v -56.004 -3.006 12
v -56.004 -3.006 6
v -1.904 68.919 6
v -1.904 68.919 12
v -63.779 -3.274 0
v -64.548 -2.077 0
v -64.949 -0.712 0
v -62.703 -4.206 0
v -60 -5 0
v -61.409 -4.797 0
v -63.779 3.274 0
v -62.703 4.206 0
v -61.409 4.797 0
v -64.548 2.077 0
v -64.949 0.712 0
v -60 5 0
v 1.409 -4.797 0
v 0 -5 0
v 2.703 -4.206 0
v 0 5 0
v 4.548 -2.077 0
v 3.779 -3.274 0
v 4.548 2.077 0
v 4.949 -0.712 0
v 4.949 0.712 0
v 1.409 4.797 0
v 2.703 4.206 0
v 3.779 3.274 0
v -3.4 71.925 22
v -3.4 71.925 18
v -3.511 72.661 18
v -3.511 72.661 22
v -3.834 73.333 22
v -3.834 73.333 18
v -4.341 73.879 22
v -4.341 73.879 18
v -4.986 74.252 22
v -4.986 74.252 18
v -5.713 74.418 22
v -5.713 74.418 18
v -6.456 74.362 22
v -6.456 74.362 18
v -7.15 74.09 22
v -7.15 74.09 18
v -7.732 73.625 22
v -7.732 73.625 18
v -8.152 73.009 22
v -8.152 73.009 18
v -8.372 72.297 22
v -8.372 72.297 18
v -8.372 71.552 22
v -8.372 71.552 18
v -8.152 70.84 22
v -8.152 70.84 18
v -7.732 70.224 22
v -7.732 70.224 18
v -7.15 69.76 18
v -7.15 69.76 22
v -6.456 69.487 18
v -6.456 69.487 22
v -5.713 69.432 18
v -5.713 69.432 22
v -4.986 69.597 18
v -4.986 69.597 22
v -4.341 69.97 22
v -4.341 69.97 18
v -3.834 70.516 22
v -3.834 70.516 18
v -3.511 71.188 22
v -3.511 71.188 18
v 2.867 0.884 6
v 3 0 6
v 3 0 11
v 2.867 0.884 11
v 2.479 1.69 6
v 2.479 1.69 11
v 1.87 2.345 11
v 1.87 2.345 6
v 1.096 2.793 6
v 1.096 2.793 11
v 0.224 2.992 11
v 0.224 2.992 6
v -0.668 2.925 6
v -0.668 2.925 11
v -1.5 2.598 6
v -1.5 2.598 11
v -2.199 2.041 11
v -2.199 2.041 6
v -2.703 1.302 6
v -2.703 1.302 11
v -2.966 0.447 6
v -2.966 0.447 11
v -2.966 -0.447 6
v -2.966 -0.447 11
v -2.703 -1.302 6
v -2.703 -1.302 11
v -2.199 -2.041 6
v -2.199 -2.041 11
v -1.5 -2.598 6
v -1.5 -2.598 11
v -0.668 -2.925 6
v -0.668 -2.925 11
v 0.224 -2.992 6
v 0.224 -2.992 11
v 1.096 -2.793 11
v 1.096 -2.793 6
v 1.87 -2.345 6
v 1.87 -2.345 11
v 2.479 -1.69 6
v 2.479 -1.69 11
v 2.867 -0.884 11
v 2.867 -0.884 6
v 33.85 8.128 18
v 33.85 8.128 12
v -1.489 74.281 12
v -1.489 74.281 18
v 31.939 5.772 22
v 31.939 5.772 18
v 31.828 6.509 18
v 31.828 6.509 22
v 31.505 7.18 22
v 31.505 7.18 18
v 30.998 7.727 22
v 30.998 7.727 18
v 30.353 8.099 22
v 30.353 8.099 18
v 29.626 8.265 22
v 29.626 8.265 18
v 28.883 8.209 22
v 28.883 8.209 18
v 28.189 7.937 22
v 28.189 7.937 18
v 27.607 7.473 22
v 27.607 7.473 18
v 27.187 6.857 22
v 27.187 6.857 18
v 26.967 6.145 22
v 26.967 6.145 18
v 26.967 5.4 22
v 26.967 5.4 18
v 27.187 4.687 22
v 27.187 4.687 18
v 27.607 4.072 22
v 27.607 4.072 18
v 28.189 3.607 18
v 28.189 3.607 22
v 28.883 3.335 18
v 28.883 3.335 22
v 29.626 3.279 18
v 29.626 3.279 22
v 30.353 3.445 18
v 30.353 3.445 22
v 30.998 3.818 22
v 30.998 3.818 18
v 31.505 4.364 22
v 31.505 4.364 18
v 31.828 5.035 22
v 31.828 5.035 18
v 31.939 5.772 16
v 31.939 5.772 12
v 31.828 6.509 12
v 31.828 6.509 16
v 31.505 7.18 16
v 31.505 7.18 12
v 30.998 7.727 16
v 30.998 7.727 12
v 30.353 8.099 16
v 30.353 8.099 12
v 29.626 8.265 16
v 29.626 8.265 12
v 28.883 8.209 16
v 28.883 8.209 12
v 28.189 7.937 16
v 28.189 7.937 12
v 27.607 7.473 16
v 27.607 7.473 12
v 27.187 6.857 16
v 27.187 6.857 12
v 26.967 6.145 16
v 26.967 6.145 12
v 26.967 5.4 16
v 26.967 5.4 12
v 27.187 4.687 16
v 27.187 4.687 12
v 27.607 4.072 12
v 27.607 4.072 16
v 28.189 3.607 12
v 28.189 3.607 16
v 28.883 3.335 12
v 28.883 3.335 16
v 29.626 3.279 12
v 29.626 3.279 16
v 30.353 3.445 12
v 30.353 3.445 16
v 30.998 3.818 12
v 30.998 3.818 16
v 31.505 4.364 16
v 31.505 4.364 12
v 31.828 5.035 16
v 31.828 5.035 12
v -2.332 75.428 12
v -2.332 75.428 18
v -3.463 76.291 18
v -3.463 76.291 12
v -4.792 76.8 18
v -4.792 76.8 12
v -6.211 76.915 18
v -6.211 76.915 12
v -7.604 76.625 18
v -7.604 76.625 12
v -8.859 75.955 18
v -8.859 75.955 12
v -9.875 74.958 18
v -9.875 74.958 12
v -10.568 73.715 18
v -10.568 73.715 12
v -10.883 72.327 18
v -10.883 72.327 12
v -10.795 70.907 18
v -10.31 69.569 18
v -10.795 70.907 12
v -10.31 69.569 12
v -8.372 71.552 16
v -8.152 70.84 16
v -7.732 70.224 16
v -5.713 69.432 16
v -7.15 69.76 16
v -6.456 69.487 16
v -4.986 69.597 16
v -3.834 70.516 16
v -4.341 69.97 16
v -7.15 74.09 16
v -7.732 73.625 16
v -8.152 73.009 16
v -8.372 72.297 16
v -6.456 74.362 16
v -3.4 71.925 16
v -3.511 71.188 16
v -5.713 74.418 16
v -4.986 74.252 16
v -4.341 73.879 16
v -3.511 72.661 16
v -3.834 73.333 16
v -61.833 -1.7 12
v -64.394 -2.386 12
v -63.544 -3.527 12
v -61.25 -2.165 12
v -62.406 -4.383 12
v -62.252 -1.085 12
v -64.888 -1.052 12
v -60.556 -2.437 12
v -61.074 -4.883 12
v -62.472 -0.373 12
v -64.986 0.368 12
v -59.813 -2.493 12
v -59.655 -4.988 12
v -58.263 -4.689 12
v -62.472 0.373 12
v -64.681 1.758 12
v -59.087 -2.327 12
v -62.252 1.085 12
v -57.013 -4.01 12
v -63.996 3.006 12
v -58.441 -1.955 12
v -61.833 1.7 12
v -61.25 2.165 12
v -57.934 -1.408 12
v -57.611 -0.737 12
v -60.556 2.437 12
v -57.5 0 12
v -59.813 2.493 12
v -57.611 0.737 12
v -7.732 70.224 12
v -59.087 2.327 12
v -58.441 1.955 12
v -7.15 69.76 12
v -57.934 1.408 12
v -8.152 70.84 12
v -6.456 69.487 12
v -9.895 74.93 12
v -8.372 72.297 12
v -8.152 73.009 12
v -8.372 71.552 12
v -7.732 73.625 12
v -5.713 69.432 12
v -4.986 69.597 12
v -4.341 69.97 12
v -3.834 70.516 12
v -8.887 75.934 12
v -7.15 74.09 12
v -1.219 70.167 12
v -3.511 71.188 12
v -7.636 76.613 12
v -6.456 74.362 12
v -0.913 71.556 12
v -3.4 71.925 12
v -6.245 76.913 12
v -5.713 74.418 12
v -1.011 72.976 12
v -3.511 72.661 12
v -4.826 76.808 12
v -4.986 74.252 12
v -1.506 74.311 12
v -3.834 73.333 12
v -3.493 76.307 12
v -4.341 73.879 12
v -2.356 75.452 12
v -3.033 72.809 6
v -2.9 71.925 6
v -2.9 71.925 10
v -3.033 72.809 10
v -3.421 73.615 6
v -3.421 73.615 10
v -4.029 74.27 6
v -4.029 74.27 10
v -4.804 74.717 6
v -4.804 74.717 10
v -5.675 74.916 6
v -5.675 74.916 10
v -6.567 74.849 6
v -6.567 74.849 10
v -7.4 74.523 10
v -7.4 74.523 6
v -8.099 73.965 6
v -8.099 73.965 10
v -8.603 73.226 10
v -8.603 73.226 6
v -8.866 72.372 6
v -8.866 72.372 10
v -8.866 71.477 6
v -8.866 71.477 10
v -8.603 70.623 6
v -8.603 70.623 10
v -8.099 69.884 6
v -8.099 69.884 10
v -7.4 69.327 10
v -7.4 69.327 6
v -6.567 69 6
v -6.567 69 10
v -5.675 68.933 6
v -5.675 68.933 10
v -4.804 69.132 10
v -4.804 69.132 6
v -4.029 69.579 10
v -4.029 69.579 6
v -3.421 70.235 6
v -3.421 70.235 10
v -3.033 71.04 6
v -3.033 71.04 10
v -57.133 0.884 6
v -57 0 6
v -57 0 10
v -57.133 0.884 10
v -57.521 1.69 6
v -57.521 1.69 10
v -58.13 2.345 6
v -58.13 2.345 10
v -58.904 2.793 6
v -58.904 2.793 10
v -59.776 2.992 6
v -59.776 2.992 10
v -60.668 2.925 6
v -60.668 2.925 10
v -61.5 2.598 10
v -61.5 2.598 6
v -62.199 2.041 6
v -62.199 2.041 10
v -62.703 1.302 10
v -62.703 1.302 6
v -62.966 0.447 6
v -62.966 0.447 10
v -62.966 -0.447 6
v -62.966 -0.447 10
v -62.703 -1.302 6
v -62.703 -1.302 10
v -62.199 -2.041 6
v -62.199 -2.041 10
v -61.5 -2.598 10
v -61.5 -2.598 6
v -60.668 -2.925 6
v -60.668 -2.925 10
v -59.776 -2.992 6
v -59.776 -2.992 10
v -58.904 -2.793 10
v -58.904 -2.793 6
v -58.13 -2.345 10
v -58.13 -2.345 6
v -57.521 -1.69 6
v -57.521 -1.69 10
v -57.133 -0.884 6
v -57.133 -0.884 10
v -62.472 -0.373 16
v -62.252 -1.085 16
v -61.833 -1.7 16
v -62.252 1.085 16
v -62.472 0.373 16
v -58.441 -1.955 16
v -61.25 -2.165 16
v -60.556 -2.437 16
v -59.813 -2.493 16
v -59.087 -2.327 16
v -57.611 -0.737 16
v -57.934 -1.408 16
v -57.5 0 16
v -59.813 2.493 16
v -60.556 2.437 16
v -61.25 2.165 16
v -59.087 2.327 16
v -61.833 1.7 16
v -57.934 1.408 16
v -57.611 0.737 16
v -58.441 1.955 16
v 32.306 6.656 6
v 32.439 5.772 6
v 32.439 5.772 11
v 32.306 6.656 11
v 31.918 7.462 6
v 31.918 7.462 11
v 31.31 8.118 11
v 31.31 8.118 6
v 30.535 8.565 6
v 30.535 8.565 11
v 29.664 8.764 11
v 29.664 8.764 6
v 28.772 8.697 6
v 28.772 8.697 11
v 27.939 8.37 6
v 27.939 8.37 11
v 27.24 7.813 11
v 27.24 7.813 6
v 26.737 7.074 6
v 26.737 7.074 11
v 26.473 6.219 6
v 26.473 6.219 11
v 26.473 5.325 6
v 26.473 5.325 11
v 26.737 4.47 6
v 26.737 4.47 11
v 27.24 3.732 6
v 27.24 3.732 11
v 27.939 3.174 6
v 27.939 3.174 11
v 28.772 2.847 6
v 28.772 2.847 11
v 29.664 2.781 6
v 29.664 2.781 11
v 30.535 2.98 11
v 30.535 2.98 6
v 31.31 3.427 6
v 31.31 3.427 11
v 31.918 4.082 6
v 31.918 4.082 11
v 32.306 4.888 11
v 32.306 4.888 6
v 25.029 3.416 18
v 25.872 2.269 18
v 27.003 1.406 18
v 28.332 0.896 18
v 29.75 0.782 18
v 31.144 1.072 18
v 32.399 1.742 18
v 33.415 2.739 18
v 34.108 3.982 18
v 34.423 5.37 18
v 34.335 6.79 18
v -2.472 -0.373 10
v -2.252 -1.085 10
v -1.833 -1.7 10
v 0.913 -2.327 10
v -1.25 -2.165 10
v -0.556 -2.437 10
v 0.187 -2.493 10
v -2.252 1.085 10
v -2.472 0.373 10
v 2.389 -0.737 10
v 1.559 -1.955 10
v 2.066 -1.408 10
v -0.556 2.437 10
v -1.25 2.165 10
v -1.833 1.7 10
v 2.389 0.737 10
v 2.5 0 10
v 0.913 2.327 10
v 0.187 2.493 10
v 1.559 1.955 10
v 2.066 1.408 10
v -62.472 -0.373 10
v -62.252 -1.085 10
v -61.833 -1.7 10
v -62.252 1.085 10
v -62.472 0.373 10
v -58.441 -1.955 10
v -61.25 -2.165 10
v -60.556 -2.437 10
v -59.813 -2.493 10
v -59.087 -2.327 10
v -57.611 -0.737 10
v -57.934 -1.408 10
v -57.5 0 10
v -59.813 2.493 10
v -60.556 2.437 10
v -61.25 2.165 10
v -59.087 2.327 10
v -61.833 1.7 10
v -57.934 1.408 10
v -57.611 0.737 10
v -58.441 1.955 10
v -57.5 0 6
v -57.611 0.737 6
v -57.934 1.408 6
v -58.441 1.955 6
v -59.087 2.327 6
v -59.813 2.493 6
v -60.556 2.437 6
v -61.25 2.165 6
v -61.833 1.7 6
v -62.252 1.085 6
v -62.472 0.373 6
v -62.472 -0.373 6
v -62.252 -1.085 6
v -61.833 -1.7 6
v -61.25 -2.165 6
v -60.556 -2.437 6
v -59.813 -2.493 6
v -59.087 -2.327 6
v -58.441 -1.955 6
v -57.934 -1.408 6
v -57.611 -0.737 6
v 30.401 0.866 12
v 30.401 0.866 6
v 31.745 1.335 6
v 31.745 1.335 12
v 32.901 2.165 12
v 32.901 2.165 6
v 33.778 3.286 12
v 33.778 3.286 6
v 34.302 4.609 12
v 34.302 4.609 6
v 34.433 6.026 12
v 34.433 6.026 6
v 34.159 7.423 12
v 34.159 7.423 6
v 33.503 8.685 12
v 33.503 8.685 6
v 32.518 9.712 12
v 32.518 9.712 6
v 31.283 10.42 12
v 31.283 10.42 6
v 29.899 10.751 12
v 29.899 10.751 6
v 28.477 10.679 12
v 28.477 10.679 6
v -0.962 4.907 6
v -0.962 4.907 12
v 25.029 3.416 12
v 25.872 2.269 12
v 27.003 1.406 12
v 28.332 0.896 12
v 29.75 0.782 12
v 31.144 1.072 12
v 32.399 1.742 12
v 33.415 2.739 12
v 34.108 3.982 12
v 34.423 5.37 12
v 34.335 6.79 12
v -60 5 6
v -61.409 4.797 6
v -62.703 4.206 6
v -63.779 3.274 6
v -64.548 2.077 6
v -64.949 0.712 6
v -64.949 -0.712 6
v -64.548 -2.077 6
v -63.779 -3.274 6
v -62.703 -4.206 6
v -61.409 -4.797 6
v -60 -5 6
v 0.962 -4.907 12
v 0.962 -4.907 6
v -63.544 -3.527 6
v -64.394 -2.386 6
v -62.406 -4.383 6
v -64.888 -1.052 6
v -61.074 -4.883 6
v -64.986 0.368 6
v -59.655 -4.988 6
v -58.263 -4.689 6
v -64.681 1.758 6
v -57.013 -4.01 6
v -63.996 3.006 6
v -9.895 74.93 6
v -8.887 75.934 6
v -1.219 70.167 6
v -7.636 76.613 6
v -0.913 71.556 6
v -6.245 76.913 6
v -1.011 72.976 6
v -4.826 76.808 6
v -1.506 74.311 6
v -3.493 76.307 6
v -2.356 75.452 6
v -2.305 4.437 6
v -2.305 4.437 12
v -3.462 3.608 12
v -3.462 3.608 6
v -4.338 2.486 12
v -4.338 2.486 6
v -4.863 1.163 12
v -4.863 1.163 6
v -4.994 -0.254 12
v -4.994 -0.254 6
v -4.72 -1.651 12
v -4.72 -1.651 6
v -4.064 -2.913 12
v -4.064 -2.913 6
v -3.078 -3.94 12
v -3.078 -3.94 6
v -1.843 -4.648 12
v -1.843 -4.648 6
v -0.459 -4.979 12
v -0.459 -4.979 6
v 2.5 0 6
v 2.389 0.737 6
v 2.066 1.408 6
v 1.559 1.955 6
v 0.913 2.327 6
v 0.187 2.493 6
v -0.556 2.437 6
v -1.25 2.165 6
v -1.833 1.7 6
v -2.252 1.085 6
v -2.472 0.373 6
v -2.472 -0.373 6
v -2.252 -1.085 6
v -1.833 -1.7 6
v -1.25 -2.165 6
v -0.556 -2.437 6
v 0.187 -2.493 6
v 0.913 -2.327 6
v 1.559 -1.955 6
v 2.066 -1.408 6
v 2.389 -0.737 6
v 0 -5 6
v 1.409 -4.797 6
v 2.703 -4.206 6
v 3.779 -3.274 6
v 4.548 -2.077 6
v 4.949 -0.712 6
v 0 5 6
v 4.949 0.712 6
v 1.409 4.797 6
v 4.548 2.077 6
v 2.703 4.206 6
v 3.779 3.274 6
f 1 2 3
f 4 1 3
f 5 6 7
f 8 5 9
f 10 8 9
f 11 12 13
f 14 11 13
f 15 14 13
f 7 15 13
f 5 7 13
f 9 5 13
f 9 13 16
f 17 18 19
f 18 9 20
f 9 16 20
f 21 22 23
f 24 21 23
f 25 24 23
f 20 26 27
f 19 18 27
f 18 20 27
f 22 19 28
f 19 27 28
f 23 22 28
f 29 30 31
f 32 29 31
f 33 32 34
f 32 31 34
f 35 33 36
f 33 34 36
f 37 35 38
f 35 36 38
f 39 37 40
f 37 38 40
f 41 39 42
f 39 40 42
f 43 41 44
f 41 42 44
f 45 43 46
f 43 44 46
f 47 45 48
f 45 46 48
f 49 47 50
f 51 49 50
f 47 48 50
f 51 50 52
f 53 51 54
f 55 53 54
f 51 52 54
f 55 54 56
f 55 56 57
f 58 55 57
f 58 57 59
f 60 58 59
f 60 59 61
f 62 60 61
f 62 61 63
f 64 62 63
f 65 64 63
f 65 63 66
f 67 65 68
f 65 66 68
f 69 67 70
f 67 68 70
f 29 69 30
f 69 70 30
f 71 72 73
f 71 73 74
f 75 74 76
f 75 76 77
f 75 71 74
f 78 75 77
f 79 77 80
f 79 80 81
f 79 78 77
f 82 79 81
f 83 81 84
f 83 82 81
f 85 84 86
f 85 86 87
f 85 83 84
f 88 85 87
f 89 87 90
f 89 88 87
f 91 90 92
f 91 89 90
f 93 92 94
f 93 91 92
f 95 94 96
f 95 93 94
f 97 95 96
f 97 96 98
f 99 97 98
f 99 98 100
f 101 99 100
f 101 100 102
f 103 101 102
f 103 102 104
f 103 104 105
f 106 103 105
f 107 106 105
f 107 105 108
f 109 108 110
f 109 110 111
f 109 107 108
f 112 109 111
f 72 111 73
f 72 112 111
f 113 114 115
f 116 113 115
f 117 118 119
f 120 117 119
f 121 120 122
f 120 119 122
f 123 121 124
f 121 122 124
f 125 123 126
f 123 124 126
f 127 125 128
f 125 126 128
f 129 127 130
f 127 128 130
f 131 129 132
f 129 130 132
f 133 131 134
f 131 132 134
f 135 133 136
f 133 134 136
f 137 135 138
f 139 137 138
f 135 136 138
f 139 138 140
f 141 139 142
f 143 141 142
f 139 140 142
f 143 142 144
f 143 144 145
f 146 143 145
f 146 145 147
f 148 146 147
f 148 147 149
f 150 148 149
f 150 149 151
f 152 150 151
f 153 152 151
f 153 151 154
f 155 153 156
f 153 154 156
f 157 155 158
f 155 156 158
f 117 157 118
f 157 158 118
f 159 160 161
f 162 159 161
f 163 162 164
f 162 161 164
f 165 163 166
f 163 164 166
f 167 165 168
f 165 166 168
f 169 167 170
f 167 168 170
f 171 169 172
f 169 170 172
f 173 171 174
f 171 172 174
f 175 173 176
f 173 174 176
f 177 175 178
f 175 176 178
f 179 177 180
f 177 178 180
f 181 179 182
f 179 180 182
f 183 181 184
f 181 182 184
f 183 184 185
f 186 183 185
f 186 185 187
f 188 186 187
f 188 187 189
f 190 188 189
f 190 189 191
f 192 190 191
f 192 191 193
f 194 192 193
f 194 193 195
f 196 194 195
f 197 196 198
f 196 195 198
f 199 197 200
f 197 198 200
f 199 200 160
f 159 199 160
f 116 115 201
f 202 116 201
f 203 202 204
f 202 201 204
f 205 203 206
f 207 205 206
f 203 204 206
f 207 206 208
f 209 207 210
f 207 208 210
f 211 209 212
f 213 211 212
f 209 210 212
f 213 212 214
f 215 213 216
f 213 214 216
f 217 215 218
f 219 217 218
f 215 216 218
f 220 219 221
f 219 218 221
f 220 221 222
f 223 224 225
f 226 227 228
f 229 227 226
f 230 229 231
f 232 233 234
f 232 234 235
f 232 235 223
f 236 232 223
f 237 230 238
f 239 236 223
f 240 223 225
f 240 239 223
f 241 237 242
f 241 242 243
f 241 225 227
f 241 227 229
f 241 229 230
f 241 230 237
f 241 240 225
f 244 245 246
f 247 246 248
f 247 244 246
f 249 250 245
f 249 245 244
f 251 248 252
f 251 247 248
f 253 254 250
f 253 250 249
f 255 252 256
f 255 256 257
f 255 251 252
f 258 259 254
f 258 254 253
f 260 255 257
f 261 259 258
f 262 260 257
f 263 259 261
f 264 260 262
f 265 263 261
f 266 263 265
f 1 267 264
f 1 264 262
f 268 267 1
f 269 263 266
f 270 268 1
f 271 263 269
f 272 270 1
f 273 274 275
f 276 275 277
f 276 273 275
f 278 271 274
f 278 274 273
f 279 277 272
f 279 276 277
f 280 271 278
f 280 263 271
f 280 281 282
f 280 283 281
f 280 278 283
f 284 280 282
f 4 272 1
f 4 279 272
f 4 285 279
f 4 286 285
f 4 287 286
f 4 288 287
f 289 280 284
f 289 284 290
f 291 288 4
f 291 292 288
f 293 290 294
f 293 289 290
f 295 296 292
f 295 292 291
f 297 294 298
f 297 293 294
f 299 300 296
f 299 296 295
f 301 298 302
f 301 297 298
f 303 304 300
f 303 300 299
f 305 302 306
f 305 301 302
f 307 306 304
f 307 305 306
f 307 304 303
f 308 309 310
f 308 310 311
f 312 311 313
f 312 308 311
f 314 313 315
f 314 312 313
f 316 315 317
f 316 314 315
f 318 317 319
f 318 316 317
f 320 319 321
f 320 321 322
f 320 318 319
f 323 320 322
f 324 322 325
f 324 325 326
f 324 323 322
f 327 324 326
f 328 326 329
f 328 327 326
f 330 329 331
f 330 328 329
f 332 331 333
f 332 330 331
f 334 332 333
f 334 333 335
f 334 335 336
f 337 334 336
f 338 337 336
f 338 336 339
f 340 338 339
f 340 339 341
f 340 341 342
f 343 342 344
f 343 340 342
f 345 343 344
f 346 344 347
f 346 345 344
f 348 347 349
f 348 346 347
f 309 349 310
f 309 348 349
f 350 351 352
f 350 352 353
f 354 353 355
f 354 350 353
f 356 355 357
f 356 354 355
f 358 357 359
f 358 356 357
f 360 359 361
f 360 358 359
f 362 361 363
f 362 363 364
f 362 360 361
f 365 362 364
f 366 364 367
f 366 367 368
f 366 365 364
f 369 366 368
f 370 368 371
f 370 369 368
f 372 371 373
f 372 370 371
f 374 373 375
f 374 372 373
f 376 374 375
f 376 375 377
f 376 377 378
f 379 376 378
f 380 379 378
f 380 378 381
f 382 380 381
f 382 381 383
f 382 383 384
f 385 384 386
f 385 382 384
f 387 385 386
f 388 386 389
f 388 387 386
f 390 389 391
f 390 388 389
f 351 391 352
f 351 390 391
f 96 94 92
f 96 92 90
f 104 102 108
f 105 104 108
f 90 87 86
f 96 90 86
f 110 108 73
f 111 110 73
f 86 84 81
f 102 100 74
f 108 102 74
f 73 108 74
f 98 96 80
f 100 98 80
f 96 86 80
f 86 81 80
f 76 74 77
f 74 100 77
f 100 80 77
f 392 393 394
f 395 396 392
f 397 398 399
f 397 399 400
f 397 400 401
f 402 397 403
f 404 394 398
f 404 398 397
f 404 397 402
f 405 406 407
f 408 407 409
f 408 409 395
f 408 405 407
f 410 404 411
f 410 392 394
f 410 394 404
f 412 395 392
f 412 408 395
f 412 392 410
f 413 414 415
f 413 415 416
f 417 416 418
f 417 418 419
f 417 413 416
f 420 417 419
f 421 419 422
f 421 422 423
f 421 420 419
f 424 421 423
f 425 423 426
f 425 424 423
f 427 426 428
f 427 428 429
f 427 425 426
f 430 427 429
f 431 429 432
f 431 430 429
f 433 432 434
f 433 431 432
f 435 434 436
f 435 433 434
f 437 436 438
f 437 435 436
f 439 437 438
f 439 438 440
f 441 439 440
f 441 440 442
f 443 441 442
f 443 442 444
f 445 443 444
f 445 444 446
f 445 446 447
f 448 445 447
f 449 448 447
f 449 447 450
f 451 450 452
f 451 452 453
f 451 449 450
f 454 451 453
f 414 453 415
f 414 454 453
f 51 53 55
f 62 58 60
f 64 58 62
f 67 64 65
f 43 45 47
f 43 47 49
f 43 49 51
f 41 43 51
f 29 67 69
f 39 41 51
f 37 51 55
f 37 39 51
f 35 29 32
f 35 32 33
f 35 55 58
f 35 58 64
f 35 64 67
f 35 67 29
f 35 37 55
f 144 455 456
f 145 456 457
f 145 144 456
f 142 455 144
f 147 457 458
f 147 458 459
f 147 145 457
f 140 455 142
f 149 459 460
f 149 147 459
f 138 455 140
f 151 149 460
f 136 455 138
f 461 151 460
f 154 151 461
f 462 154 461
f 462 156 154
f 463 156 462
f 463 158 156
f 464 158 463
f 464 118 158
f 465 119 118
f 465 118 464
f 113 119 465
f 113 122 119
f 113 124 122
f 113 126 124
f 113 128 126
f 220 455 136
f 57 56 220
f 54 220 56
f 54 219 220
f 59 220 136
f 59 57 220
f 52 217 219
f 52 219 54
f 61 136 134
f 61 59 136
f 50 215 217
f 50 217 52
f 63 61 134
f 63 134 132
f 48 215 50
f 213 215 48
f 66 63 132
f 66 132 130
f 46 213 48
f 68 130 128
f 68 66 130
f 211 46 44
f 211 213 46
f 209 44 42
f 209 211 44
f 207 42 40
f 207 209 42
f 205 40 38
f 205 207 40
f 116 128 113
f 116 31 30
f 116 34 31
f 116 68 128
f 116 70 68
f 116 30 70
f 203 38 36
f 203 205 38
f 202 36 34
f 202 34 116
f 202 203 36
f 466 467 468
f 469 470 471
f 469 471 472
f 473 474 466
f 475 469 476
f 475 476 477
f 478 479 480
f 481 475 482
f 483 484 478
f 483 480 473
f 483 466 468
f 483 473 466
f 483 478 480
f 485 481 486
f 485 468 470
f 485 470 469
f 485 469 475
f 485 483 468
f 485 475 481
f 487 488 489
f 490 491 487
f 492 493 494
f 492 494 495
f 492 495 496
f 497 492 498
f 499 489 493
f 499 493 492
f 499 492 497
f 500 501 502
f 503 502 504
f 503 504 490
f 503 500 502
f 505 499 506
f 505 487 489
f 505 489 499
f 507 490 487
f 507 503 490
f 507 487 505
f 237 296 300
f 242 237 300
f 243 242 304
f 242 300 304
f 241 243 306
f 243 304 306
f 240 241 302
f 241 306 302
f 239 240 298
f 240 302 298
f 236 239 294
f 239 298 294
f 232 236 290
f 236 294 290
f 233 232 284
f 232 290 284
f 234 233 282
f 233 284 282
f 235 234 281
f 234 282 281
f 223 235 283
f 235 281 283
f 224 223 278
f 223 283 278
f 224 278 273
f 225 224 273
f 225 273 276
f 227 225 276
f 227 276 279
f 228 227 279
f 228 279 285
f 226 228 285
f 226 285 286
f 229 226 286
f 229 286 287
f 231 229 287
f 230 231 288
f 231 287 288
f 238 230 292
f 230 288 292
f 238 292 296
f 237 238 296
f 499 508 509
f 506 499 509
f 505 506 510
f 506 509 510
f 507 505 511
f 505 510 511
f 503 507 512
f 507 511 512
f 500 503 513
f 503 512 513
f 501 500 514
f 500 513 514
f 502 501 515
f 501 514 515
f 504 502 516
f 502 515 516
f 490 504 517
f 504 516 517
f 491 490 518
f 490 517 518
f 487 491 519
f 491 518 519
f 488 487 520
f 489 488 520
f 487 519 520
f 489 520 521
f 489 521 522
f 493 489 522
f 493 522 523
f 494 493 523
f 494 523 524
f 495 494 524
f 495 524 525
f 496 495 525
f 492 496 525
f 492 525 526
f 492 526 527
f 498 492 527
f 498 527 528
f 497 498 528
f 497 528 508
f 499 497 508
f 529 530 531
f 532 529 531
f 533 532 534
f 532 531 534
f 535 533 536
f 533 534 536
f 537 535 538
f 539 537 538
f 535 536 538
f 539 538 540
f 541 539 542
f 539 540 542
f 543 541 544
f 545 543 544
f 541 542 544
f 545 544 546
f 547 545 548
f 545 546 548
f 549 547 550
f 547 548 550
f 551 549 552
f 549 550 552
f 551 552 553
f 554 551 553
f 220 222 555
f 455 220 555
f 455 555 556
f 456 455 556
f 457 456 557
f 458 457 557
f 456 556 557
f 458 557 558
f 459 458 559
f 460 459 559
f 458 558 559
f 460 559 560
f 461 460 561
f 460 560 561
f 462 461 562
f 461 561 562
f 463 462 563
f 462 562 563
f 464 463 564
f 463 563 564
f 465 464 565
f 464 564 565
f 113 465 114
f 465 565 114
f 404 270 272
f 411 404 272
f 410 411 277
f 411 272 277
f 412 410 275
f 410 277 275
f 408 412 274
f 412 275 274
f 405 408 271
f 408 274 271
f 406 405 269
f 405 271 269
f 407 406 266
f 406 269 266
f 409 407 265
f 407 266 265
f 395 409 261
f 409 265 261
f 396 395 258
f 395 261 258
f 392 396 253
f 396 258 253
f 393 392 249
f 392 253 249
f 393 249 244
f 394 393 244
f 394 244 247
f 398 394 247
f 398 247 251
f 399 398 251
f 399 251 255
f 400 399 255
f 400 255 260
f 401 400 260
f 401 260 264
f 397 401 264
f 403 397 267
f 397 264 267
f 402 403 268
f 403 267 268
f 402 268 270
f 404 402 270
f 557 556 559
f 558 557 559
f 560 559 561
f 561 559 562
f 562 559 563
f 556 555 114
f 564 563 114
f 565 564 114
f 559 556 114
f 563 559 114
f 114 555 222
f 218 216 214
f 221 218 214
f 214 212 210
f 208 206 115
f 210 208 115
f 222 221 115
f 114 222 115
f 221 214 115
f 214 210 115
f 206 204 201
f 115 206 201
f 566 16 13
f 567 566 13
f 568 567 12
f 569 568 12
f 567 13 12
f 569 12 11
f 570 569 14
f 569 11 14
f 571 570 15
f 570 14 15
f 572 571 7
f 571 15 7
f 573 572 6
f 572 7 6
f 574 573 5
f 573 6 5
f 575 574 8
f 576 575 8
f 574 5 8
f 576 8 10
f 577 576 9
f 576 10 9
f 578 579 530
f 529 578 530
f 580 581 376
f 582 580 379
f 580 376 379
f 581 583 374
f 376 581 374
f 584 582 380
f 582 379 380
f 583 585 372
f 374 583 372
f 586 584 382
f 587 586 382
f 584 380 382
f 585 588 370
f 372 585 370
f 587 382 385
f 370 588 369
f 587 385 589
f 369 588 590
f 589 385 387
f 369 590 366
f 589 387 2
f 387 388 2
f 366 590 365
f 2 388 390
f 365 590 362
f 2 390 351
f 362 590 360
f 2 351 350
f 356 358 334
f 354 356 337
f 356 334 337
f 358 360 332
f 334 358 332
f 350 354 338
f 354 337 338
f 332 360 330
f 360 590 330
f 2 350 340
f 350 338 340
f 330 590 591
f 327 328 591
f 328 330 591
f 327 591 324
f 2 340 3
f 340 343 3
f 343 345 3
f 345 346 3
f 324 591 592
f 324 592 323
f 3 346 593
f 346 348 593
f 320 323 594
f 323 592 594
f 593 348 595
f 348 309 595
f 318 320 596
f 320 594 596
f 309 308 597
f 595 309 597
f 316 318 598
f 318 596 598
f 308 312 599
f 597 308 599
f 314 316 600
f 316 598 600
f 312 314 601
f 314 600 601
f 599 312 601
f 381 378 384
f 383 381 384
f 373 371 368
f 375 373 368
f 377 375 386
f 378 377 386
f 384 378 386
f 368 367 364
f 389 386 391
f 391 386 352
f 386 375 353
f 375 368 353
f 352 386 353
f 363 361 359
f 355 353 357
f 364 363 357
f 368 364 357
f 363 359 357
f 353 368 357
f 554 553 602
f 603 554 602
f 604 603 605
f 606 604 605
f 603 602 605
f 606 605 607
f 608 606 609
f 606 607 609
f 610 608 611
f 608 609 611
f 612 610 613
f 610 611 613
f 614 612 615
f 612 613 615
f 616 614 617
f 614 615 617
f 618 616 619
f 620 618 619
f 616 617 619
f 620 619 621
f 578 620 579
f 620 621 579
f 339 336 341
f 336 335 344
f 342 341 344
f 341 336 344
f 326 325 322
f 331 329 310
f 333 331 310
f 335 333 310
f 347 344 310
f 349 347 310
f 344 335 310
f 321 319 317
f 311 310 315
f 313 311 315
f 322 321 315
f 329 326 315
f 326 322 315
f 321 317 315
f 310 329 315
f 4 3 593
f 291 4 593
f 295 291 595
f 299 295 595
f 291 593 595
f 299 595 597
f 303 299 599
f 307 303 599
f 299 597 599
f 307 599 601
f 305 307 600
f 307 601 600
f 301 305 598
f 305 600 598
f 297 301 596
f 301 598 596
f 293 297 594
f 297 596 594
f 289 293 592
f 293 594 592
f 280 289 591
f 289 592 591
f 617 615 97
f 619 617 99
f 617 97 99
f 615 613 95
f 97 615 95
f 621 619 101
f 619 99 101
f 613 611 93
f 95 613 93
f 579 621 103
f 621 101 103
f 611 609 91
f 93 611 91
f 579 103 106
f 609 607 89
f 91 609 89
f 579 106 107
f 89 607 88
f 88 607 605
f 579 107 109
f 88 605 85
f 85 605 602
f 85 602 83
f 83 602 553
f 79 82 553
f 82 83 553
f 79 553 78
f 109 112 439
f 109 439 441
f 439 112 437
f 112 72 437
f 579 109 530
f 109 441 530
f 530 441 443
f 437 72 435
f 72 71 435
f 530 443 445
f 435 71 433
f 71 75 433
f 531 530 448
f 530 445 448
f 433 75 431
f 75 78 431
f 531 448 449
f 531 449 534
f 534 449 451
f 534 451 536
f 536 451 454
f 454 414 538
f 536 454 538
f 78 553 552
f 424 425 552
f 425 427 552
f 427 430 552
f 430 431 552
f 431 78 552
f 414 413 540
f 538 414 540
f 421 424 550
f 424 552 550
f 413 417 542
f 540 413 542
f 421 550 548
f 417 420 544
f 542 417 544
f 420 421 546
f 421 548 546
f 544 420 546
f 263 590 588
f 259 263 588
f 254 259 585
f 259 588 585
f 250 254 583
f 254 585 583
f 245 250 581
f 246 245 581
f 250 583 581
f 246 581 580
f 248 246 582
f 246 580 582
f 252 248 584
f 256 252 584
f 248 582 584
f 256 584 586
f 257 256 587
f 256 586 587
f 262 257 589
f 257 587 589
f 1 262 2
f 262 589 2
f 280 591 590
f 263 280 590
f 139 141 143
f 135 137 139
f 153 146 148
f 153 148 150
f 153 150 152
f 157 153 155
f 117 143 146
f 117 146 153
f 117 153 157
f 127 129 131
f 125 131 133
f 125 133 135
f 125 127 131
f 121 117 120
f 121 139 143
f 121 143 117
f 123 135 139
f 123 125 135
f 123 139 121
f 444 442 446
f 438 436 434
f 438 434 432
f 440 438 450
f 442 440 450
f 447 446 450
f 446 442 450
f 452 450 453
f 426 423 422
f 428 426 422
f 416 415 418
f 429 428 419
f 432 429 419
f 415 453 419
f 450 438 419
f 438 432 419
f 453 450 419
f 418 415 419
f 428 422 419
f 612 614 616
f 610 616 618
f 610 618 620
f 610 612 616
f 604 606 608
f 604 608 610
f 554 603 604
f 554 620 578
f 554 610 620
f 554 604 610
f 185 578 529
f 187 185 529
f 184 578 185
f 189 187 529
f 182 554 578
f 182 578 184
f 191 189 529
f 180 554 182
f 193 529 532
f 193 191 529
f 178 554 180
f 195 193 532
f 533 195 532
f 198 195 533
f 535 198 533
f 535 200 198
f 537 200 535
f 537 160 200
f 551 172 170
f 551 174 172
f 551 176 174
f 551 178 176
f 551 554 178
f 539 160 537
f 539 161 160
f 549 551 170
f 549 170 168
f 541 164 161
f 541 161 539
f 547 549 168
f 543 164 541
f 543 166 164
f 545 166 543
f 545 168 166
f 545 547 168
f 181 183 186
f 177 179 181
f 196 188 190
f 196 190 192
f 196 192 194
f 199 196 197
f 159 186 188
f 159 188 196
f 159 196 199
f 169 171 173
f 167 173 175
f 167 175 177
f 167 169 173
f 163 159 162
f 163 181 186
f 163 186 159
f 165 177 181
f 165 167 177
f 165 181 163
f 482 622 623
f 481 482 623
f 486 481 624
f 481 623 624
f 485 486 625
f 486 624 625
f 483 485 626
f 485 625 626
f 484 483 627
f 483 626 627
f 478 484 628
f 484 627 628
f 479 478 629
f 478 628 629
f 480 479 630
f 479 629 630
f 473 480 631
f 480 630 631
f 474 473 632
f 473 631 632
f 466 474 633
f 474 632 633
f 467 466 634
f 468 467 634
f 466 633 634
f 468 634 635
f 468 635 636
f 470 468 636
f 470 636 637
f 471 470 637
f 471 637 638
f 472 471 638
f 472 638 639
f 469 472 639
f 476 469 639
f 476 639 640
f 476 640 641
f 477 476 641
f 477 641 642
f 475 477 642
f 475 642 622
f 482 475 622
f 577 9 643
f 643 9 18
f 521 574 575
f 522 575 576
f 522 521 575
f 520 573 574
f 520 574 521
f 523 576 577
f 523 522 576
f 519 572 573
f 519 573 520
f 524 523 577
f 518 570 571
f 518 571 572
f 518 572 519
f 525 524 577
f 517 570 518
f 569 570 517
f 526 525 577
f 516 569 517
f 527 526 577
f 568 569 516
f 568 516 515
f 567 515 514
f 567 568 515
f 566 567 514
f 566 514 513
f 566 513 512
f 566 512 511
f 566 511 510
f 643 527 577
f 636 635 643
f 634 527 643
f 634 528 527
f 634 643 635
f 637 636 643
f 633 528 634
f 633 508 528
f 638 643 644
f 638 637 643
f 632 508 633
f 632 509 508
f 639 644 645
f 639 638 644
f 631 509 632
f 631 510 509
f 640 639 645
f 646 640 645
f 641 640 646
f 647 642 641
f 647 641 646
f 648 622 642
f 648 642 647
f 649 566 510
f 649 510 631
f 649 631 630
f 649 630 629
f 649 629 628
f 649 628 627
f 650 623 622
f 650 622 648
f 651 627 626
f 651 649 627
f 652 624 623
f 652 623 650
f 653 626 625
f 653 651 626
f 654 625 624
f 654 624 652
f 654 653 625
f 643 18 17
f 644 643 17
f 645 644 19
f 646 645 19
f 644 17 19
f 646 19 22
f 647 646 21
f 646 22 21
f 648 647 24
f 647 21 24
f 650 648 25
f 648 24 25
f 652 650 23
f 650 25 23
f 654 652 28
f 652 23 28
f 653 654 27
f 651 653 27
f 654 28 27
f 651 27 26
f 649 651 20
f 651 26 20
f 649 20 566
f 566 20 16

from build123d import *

# Parameters (mm, degrees)
F6_DEPTH  = 6
F7_R      = 2.5
F8_DEPTH  = 10
F9_R      = 3
F10_DEPTH = 5
F12_DEPTH = 6
F13_R     = 2.5
F14_DEPTH = 4
F15_R     = 3
F16_DEPTH = 5
F18_DEPTH = 6
F19_R     = 2.5
F20_DEPTH = 4
F21_R     = 3
F22_DEPTH = 4
F24_DEPTH = 6
F25_R     = 2.5
F26_DEPTH = 4


with BuildPart() as f6:
    # F5 (on Top) → F6 (new body)
    with BuildSketch(Plane.XY):
        with BuildLine():
            ThreePointArc((0, -5), (5, 0), (0, 5))
            Line((0, 5), (-60, 5))
            ThreePointArc((-60, 5), (-65, 0), (-60, -5))
            Line((-60, -5), (0, -5))
        make_face()
    extrude(amount=F6_DEPTH)

    # F7 (on Top) → F8 (join)
    with BuildSketch(Plane.XY):
        with Locations((-60, 0)):
            Circle(F7_R)
        Circle(F7_R)
    extrude(amount=F8_DEPTH)

    # F9 (on Top) → F10 (join)
    with BuildSketch(Plane.XY):
        with Locations((-60, 0)):
            Circle(F9_R)
        Circle(F9_R)
    extrude(amount=F10_DEPTH)


with BuildPart() as f12:
    # F11 (on offset) → F12 (new body)
    with BuildSketch(Plane.XY.offset(6)):
        with BuildLine():
            ThreePointArc((-0.9620224756, 4.9065785183), (-4.9065785183, -0.9620224756), (0.9620224756, -4.9065785183))
            Line((0.9620224756, -4.9065785183), (30.4014935855, 0.8655563354))
            ThreePointArc((30.4014935855, 0.8655563354), (34.3460496282, 6.7341573293), (28.4774486343, 10.678713372))
            Line((28.4774486343, 10.678713372), (-0.9620224756, 4.9065785183))
        make_face()
    extrude(amount=F12_DEPTH)

    # F13 (on offset) → F14 (join)
    with BuildSketch(Plane.XY.offset(12)):
        with Locations((29.4394711099, 5.7721348537)):
            Circle(F13_R)
    extrude(amount=F14_DEPTH)

    # F15 (on offset) → F16 (cut)
    with BuildSketch(Plane.XY.offset(6)):
        Circle(F15_R)
        with Locations((29.4394711099, 5.7721348537)):
            Circle(F15_R)
    extrude(amount=F16_DEPTH, mode=Mode.SUBTRACT)


with BuildPart() as f18:
    # F17 (on offset) → F18 (new body)
    with BuildSketch(Plane.XY.offset(6)):
        with BuildLine():
            ThreePointArc((-63.9958112379, 3.0055769082), (-63.0055769082, -3.9958112379), (-56.0041887621, -3.0055769082))
            Line((-56.0041887621, -3.0055769082), (-1.9038044142, 68.9190253736))
            ThreePointArc((-1.9038044142, 68.9190253736), (-2.8940387438, 75.9204135197), (-9.8954268899, 74.9301791901))
            Line((-9.8954268899, 74.9301791901), (-63.9958112379, 3.0055769082))
        make_face()
    extrude(amount=F18_DEPTH)

    # F19 (on offset) → F20 (join)
    with BuildSketch(Plane.XY.offset(12)):
        with Locations((-5.899615652, 71.9246022818)):
            Circle(F19_R)
        with Locations((-60, 0)):
            Circle(F19_R)
    extrude(amount=F20_DEPTH)

    # F21 (on offset) → F22 (cut)
    with BuildSketch(Plane.XY.offset(6)):
        with Locations((-60, 0)):
            Circle(F21_R)
        with Locations((-5.899615652, 71.9246022818)):
            Circle(F21_R)
    extrude(amount=F22_DEPTH, mode=Mode.SUBTRACT)


with BuildPart() as f24:
    # F23 (on offset) → F24 (new body)
    with BuildSketch(Plane.XY.offset(12)):
        with BuildLine():
            ThreePointArc((-1.4894511568, 74.2805413993), (-8.2555547695, 76.3347667771), (-10.3097801472, 69.5686631644))
            Line((-10.3097801472, 69.5686631644), (25.0293066147, 3.4161957362))
            ThreePointArc((25.0293066147, 3.4161957362), (31.7954102274, 1.3619703585), (33.8496356051, 8.1280739712))
            Line((33.8496356051, 8.1280739712), (-1.4894511568, 74.2805413993))
        make_face()
    extrude(amount=F24_DEPTH)

    # F25 (on offset) → F26 (join)
    with BuildSketch(Plane.XY.offset(18)):
        with Locations((29.4394711099, 5.7721348537)):
            Circle(F25_R)
        with Locations((-5.899615652, 71.9246022818)):
            Circle(F25_R)
    extrude(amount=F26_DEPTH)


solid = Compound([f6.part, f12.part, f18.part, f24.part])
